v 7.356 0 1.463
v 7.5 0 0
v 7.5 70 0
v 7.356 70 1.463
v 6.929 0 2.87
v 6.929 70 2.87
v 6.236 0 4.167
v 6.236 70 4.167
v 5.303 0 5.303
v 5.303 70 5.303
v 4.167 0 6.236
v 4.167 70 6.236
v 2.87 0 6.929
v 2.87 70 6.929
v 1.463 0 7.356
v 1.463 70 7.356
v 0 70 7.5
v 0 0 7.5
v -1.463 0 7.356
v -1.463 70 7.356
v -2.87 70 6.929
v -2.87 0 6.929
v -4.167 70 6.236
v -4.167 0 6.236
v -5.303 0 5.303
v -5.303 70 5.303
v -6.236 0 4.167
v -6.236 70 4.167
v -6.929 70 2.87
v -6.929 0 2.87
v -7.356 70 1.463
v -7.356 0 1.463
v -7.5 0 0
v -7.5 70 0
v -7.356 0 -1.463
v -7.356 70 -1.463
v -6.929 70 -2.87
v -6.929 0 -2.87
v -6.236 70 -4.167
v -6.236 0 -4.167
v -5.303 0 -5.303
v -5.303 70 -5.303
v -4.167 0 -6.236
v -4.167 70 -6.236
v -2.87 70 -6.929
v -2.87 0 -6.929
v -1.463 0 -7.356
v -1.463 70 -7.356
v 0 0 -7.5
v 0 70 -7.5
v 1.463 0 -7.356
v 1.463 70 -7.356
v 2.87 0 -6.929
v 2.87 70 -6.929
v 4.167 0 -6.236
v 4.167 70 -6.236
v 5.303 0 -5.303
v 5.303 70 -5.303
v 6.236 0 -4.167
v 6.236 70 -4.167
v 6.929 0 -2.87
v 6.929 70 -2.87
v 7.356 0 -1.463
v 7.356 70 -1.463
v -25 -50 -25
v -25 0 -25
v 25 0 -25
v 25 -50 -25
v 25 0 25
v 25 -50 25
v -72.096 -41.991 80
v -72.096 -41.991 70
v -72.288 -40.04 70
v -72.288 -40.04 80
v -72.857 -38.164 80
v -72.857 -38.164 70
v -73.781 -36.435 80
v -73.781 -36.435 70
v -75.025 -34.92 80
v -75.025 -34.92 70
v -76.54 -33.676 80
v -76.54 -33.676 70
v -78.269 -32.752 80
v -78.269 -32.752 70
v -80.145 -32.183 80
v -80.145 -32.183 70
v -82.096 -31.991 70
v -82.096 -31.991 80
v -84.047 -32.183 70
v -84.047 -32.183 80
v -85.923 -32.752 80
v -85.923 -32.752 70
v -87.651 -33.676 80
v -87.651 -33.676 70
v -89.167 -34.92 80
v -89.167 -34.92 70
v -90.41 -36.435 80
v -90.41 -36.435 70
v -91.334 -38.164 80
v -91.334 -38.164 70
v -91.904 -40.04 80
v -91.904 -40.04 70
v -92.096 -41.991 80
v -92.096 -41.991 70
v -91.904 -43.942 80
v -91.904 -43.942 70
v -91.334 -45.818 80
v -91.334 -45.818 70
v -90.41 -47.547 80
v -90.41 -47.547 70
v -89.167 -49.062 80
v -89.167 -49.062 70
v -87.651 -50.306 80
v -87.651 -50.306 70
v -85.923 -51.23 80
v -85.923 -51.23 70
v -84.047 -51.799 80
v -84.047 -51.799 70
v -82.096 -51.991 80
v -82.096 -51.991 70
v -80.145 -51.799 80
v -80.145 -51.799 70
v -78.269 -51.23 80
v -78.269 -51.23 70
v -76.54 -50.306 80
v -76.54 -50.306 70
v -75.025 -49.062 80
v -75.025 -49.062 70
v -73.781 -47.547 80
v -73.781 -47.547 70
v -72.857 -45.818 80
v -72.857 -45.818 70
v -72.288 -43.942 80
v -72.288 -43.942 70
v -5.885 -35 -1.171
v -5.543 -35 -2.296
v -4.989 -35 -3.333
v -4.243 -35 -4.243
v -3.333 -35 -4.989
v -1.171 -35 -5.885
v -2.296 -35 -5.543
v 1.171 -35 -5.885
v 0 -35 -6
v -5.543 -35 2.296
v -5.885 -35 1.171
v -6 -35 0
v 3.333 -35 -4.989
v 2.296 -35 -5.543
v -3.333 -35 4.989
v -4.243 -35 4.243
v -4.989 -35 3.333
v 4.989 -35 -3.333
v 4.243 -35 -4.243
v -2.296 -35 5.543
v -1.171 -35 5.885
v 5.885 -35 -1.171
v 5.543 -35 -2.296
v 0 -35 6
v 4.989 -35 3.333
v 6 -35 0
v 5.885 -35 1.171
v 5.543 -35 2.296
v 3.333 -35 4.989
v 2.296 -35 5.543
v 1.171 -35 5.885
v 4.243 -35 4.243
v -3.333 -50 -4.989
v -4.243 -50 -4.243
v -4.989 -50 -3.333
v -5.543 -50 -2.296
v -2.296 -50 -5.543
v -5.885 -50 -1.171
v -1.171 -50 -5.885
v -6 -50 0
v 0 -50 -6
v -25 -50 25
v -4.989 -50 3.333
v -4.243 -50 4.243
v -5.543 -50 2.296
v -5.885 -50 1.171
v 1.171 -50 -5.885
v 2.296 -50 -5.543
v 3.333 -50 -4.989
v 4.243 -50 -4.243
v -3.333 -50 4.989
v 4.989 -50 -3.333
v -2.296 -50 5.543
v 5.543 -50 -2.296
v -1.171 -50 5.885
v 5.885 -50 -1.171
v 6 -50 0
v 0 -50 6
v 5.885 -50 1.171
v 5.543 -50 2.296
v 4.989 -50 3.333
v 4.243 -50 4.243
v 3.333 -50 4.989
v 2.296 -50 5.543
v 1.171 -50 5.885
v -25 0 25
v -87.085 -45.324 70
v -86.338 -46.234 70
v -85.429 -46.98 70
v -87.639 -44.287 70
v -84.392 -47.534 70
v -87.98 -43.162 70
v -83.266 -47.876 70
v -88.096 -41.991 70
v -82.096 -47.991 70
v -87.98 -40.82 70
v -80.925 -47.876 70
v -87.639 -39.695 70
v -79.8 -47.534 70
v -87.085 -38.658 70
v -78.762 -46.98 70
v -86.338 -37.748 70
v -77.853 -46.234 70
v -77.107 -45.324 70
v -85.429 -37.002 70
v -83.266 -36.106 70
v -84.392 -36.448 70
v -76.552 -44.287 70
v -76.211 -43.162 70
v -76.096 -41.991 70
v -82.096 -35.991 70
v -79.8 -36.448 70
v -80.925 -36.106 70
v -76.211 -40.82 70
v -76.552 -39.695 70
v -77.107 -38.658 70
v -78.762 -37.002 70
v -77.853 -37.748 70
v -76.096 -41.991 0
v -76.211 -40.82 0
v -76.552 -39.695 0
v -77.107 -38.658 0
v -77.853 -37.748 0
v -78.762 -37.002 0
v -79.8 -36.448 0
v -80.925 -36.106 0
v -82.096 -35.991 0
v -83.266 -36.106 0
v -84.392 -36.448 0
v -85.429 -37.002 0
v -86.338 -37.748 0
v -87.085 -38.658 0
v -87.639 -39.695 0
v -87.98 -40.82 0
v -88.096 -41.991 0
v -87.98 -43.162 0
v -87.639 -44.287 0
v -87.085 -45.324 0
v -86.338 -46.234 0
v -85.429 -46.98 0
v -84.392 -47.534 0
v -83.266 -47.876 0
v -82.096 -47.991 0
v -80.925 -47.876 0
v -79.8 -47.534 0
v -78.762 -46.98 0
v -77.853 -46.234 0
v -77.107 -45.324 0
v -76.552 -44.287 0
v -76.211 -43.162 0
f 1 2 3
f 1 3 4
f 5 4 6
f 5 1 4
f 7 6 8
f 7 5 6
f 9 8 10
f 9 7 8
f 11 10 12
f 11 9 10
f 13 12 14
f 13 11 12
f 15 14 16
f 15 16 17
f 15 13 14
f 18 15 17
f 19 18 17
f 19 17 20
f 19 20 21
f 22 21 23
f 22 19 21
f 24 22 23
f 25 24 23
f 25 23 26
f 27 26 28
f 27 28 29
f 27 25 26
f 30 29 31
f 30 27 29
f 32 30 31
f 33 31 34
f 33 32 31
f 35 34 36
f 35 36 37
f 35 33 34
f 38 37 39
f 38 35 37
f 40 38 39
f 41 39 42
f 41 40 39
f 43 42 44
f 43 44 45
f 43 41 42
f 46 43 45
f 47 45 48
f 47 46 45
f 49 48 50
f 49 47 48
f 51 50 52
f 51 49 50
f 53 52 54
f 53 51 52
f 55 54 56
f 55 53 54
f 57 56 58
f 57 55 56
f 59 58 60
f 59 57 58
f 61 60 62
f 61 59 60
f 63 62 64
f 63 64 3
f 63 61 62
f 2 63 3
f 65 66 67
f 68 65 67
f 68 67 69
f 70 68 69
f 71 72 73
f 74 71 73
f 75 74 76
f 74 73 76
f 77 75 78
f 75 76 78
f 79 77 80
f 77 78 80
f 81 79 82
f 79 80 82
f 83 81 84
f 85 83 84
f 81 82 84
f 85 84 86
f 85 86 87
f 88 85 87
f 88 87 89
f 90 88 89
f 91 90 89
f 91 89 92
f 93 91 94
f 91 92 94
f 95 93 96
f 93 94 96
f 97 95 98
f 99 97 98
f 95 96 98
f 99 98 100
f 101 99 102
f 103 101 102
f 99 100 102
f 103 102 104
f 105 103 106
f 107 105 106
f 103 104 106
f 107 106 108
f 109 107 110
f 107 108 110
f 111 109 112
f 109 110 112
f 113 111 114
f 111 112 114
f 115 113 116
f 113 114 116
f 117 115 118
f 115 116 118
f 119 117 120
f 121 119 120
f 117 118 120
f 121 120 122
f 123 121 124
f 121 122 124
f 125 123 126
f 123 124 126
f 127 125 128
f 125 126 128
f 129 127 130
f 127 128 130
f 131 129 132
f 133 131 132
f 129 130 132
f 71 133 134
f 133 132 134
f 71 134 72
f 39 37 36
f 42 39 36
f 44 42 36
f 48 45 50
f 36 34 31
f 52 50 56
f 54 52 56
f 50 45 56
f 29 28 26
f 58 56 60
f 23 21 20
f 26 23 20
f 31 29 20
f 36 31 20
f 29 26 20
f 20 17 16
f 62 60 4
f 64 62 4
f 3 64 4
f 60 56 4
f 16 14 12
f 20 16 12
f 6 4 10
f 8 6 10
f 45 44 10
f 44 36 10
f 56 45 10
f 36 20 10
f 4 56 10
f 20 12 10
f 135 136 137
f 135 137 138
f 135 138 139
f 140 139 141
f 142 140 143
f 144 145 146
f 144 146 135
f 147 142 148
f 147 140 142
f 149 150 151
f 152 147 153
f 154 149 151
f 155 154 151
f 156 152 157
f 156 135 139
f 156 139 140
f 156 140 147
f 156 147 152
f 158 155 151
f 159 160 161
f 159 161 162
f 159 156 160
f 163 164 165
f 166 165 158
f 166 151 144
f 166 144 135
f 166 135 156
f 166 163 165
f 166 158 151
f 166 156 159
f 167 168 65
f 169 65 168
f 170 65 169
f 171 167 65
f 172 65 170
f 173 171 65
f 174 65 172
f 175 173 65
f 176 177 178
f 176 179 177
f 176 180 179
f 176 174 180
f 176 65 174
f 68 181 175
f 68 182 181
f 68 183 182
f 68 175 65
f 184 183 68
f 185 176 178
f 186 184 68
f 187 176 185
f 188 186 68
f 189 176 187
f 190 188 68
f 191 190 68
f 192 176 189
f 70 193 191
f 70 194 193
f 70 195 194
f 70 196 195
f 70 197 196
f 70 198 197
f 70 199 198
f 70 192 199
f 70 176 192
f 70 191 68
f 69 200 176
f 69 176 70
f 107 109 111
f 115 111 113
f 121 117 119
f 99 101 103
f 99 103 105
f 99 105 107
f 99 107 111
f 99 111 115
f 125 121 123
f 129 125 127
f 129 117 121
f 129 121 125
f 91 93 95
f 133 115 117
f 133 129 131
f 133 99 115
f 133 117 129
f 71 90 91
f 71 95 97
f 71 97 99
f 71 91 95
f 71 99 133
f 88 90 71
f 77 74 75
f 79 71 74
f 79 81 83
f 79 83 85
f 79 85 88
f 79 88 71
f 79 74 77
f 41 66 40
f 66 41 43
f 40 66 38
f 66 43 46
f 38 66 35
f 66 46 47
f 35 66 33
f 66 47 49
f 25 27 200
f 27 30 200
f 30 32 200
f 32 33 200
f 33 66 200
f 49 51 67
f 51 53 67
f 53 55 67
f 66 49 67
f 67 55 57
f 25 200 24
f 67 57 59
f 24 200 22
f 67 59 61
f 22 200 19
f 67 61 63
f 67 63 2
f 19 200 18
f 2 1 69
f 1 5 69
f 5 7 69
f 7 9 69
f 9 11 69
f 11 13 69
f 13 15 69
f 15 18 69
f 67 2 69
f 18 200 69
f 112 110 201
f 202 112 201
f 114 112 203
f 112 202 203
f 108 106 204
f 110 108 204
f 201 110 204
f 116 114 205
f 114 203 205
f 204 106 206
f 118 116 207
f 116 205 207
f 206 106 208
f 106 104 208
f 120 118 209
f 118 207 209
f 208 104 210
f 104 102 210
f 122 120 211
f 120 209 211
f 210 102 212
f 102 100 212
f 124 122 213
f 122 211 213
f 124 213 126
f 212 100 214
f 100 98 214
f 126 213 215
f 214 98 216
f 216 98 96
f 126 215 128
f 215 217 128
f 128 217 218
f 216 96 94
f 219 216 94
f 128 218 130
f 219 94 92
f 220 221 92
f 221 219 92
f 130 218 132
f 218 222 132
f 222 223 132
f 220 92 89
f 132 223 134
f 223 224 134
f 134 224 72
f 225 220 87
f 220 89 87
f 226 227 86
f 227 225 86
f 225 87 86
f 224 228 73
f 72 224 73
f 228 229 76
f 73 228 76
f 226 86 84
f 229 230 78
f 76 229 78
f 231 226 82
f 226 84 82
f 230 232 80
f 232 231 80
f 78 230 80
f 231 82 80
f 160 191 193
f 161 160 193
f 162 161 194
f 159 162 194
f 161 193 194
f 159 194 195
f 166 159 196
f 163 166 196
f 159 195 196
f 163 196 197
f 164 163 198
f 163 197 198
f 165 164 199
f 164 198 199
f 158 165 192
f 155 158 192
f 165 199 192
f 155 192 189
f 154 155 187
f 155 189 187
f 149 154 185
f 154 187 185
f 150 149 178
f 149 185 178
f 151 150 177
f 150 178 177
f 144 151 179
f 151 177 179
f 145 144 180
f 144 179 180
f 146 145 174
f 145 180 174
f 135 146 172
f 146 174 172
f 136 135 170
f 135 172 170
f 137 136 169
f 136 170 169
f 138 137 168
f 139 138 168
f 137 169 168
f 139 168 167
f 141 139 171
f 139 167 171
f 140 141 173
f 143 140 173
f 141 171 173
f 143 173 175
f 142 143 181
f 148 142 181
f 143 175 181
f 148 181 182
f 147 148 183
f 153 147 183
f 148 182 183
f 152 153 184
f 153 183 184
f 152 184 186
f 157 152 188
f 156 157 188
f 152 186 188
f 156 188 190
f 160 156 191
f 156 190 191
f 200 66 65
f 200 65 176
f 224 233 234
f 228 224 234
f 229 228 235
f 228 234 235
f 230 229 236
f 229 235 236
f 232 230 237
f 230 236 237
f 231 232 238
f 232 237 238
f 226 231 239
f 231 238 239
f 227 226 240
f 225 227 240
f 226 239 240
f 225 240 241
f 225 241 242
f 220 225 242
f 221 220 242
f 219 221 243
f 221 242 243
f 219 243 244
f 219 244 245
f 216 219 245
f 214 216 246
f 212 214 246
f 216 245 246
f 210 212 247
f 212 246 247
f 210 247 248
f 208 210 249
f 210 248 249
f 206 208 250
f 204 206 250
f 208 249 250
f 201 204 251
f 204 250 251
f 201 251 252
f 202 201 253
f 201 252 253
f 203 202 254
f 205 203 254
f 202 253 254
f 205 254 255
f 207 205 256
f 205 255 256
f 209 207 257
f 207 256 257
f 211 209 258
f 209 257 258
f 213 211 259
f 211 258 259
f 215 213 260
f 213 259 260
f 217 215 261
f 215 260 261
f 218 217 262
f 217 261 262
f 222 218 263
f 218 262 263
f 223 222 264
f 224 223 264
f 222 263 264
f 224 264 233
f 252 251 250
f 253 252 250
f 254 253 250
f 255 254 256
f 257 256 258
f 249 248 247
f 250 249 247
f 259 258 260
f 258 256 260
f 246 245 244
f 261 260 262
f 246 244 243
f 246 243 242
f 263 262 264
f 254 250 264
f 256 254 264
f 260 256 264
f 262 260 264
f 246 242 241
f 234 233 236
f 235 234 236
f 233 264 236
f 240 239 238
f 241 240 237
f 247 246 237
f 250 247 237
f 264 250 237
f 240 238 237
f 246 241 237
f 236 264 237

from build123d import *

# Parameters (mm, degrees)
F0_W     = 50
F0_H     = 50
F0_R     = 7.5
F1_DEPTH = 50
F2_DEPTH = 70
F3_R     = 6
F4_DEPTH = 15
F5_R     = 6
F6_DEPTH = 70
F7_R     = 10
F7_R_2   = 6
F8_DEPTH = 10


with BuildPart() as f1:
    # F0 (on Front) → F1 (new body)
    with BuildSketch(Plane.XZ):
        Rectangle(F0_W, F0_H)
        Circle(F0_R, mode=Mode.SUBTRACT)
        Circle(F0_R)
    extrude(amount=F1_DEPTH)

    # F0 (on Front) → F2 (join)
    with BuildSketch(Plane.XZ):
        Circle(F0_R)
    extrude(amount=-F2_DEPTH)

    # F3 (on face) → F4 (cut)
    with BuildSketch(Plane.XZ.offset(50)):
        Circle(F3_R)
    extrude(amount=-F4_DEPTH, mode=Mode.SUBTRACT)


with BuildPart() as f6:
    # F5 (on Top) → F6 (new body)
    with BuildSketch(Plane.XY):
        with Locations((-82.0956900716, -41.9910177588)):
            Circle(F5_R)
    extrude(amount=F6_DEPTH)

    # F7 (on face) → F8 (join)
    with BuildSketch(Plane.XY.offset(70)):
        with Locations((-82.0956900716, -41.9910177588)):
            Circle(F7_R)
        with Locations((-82.0956900716, -41.9910177588)):
            Circle(F7_R_2, mode=Mode.SUBTRACT)
        with Locations((-82.0956900716, -41.9910177588)):
            Circle(F7_R_2)
    extrude(amount=F8_DEPTH)


solid = Compound([f1.part, f6.part])
